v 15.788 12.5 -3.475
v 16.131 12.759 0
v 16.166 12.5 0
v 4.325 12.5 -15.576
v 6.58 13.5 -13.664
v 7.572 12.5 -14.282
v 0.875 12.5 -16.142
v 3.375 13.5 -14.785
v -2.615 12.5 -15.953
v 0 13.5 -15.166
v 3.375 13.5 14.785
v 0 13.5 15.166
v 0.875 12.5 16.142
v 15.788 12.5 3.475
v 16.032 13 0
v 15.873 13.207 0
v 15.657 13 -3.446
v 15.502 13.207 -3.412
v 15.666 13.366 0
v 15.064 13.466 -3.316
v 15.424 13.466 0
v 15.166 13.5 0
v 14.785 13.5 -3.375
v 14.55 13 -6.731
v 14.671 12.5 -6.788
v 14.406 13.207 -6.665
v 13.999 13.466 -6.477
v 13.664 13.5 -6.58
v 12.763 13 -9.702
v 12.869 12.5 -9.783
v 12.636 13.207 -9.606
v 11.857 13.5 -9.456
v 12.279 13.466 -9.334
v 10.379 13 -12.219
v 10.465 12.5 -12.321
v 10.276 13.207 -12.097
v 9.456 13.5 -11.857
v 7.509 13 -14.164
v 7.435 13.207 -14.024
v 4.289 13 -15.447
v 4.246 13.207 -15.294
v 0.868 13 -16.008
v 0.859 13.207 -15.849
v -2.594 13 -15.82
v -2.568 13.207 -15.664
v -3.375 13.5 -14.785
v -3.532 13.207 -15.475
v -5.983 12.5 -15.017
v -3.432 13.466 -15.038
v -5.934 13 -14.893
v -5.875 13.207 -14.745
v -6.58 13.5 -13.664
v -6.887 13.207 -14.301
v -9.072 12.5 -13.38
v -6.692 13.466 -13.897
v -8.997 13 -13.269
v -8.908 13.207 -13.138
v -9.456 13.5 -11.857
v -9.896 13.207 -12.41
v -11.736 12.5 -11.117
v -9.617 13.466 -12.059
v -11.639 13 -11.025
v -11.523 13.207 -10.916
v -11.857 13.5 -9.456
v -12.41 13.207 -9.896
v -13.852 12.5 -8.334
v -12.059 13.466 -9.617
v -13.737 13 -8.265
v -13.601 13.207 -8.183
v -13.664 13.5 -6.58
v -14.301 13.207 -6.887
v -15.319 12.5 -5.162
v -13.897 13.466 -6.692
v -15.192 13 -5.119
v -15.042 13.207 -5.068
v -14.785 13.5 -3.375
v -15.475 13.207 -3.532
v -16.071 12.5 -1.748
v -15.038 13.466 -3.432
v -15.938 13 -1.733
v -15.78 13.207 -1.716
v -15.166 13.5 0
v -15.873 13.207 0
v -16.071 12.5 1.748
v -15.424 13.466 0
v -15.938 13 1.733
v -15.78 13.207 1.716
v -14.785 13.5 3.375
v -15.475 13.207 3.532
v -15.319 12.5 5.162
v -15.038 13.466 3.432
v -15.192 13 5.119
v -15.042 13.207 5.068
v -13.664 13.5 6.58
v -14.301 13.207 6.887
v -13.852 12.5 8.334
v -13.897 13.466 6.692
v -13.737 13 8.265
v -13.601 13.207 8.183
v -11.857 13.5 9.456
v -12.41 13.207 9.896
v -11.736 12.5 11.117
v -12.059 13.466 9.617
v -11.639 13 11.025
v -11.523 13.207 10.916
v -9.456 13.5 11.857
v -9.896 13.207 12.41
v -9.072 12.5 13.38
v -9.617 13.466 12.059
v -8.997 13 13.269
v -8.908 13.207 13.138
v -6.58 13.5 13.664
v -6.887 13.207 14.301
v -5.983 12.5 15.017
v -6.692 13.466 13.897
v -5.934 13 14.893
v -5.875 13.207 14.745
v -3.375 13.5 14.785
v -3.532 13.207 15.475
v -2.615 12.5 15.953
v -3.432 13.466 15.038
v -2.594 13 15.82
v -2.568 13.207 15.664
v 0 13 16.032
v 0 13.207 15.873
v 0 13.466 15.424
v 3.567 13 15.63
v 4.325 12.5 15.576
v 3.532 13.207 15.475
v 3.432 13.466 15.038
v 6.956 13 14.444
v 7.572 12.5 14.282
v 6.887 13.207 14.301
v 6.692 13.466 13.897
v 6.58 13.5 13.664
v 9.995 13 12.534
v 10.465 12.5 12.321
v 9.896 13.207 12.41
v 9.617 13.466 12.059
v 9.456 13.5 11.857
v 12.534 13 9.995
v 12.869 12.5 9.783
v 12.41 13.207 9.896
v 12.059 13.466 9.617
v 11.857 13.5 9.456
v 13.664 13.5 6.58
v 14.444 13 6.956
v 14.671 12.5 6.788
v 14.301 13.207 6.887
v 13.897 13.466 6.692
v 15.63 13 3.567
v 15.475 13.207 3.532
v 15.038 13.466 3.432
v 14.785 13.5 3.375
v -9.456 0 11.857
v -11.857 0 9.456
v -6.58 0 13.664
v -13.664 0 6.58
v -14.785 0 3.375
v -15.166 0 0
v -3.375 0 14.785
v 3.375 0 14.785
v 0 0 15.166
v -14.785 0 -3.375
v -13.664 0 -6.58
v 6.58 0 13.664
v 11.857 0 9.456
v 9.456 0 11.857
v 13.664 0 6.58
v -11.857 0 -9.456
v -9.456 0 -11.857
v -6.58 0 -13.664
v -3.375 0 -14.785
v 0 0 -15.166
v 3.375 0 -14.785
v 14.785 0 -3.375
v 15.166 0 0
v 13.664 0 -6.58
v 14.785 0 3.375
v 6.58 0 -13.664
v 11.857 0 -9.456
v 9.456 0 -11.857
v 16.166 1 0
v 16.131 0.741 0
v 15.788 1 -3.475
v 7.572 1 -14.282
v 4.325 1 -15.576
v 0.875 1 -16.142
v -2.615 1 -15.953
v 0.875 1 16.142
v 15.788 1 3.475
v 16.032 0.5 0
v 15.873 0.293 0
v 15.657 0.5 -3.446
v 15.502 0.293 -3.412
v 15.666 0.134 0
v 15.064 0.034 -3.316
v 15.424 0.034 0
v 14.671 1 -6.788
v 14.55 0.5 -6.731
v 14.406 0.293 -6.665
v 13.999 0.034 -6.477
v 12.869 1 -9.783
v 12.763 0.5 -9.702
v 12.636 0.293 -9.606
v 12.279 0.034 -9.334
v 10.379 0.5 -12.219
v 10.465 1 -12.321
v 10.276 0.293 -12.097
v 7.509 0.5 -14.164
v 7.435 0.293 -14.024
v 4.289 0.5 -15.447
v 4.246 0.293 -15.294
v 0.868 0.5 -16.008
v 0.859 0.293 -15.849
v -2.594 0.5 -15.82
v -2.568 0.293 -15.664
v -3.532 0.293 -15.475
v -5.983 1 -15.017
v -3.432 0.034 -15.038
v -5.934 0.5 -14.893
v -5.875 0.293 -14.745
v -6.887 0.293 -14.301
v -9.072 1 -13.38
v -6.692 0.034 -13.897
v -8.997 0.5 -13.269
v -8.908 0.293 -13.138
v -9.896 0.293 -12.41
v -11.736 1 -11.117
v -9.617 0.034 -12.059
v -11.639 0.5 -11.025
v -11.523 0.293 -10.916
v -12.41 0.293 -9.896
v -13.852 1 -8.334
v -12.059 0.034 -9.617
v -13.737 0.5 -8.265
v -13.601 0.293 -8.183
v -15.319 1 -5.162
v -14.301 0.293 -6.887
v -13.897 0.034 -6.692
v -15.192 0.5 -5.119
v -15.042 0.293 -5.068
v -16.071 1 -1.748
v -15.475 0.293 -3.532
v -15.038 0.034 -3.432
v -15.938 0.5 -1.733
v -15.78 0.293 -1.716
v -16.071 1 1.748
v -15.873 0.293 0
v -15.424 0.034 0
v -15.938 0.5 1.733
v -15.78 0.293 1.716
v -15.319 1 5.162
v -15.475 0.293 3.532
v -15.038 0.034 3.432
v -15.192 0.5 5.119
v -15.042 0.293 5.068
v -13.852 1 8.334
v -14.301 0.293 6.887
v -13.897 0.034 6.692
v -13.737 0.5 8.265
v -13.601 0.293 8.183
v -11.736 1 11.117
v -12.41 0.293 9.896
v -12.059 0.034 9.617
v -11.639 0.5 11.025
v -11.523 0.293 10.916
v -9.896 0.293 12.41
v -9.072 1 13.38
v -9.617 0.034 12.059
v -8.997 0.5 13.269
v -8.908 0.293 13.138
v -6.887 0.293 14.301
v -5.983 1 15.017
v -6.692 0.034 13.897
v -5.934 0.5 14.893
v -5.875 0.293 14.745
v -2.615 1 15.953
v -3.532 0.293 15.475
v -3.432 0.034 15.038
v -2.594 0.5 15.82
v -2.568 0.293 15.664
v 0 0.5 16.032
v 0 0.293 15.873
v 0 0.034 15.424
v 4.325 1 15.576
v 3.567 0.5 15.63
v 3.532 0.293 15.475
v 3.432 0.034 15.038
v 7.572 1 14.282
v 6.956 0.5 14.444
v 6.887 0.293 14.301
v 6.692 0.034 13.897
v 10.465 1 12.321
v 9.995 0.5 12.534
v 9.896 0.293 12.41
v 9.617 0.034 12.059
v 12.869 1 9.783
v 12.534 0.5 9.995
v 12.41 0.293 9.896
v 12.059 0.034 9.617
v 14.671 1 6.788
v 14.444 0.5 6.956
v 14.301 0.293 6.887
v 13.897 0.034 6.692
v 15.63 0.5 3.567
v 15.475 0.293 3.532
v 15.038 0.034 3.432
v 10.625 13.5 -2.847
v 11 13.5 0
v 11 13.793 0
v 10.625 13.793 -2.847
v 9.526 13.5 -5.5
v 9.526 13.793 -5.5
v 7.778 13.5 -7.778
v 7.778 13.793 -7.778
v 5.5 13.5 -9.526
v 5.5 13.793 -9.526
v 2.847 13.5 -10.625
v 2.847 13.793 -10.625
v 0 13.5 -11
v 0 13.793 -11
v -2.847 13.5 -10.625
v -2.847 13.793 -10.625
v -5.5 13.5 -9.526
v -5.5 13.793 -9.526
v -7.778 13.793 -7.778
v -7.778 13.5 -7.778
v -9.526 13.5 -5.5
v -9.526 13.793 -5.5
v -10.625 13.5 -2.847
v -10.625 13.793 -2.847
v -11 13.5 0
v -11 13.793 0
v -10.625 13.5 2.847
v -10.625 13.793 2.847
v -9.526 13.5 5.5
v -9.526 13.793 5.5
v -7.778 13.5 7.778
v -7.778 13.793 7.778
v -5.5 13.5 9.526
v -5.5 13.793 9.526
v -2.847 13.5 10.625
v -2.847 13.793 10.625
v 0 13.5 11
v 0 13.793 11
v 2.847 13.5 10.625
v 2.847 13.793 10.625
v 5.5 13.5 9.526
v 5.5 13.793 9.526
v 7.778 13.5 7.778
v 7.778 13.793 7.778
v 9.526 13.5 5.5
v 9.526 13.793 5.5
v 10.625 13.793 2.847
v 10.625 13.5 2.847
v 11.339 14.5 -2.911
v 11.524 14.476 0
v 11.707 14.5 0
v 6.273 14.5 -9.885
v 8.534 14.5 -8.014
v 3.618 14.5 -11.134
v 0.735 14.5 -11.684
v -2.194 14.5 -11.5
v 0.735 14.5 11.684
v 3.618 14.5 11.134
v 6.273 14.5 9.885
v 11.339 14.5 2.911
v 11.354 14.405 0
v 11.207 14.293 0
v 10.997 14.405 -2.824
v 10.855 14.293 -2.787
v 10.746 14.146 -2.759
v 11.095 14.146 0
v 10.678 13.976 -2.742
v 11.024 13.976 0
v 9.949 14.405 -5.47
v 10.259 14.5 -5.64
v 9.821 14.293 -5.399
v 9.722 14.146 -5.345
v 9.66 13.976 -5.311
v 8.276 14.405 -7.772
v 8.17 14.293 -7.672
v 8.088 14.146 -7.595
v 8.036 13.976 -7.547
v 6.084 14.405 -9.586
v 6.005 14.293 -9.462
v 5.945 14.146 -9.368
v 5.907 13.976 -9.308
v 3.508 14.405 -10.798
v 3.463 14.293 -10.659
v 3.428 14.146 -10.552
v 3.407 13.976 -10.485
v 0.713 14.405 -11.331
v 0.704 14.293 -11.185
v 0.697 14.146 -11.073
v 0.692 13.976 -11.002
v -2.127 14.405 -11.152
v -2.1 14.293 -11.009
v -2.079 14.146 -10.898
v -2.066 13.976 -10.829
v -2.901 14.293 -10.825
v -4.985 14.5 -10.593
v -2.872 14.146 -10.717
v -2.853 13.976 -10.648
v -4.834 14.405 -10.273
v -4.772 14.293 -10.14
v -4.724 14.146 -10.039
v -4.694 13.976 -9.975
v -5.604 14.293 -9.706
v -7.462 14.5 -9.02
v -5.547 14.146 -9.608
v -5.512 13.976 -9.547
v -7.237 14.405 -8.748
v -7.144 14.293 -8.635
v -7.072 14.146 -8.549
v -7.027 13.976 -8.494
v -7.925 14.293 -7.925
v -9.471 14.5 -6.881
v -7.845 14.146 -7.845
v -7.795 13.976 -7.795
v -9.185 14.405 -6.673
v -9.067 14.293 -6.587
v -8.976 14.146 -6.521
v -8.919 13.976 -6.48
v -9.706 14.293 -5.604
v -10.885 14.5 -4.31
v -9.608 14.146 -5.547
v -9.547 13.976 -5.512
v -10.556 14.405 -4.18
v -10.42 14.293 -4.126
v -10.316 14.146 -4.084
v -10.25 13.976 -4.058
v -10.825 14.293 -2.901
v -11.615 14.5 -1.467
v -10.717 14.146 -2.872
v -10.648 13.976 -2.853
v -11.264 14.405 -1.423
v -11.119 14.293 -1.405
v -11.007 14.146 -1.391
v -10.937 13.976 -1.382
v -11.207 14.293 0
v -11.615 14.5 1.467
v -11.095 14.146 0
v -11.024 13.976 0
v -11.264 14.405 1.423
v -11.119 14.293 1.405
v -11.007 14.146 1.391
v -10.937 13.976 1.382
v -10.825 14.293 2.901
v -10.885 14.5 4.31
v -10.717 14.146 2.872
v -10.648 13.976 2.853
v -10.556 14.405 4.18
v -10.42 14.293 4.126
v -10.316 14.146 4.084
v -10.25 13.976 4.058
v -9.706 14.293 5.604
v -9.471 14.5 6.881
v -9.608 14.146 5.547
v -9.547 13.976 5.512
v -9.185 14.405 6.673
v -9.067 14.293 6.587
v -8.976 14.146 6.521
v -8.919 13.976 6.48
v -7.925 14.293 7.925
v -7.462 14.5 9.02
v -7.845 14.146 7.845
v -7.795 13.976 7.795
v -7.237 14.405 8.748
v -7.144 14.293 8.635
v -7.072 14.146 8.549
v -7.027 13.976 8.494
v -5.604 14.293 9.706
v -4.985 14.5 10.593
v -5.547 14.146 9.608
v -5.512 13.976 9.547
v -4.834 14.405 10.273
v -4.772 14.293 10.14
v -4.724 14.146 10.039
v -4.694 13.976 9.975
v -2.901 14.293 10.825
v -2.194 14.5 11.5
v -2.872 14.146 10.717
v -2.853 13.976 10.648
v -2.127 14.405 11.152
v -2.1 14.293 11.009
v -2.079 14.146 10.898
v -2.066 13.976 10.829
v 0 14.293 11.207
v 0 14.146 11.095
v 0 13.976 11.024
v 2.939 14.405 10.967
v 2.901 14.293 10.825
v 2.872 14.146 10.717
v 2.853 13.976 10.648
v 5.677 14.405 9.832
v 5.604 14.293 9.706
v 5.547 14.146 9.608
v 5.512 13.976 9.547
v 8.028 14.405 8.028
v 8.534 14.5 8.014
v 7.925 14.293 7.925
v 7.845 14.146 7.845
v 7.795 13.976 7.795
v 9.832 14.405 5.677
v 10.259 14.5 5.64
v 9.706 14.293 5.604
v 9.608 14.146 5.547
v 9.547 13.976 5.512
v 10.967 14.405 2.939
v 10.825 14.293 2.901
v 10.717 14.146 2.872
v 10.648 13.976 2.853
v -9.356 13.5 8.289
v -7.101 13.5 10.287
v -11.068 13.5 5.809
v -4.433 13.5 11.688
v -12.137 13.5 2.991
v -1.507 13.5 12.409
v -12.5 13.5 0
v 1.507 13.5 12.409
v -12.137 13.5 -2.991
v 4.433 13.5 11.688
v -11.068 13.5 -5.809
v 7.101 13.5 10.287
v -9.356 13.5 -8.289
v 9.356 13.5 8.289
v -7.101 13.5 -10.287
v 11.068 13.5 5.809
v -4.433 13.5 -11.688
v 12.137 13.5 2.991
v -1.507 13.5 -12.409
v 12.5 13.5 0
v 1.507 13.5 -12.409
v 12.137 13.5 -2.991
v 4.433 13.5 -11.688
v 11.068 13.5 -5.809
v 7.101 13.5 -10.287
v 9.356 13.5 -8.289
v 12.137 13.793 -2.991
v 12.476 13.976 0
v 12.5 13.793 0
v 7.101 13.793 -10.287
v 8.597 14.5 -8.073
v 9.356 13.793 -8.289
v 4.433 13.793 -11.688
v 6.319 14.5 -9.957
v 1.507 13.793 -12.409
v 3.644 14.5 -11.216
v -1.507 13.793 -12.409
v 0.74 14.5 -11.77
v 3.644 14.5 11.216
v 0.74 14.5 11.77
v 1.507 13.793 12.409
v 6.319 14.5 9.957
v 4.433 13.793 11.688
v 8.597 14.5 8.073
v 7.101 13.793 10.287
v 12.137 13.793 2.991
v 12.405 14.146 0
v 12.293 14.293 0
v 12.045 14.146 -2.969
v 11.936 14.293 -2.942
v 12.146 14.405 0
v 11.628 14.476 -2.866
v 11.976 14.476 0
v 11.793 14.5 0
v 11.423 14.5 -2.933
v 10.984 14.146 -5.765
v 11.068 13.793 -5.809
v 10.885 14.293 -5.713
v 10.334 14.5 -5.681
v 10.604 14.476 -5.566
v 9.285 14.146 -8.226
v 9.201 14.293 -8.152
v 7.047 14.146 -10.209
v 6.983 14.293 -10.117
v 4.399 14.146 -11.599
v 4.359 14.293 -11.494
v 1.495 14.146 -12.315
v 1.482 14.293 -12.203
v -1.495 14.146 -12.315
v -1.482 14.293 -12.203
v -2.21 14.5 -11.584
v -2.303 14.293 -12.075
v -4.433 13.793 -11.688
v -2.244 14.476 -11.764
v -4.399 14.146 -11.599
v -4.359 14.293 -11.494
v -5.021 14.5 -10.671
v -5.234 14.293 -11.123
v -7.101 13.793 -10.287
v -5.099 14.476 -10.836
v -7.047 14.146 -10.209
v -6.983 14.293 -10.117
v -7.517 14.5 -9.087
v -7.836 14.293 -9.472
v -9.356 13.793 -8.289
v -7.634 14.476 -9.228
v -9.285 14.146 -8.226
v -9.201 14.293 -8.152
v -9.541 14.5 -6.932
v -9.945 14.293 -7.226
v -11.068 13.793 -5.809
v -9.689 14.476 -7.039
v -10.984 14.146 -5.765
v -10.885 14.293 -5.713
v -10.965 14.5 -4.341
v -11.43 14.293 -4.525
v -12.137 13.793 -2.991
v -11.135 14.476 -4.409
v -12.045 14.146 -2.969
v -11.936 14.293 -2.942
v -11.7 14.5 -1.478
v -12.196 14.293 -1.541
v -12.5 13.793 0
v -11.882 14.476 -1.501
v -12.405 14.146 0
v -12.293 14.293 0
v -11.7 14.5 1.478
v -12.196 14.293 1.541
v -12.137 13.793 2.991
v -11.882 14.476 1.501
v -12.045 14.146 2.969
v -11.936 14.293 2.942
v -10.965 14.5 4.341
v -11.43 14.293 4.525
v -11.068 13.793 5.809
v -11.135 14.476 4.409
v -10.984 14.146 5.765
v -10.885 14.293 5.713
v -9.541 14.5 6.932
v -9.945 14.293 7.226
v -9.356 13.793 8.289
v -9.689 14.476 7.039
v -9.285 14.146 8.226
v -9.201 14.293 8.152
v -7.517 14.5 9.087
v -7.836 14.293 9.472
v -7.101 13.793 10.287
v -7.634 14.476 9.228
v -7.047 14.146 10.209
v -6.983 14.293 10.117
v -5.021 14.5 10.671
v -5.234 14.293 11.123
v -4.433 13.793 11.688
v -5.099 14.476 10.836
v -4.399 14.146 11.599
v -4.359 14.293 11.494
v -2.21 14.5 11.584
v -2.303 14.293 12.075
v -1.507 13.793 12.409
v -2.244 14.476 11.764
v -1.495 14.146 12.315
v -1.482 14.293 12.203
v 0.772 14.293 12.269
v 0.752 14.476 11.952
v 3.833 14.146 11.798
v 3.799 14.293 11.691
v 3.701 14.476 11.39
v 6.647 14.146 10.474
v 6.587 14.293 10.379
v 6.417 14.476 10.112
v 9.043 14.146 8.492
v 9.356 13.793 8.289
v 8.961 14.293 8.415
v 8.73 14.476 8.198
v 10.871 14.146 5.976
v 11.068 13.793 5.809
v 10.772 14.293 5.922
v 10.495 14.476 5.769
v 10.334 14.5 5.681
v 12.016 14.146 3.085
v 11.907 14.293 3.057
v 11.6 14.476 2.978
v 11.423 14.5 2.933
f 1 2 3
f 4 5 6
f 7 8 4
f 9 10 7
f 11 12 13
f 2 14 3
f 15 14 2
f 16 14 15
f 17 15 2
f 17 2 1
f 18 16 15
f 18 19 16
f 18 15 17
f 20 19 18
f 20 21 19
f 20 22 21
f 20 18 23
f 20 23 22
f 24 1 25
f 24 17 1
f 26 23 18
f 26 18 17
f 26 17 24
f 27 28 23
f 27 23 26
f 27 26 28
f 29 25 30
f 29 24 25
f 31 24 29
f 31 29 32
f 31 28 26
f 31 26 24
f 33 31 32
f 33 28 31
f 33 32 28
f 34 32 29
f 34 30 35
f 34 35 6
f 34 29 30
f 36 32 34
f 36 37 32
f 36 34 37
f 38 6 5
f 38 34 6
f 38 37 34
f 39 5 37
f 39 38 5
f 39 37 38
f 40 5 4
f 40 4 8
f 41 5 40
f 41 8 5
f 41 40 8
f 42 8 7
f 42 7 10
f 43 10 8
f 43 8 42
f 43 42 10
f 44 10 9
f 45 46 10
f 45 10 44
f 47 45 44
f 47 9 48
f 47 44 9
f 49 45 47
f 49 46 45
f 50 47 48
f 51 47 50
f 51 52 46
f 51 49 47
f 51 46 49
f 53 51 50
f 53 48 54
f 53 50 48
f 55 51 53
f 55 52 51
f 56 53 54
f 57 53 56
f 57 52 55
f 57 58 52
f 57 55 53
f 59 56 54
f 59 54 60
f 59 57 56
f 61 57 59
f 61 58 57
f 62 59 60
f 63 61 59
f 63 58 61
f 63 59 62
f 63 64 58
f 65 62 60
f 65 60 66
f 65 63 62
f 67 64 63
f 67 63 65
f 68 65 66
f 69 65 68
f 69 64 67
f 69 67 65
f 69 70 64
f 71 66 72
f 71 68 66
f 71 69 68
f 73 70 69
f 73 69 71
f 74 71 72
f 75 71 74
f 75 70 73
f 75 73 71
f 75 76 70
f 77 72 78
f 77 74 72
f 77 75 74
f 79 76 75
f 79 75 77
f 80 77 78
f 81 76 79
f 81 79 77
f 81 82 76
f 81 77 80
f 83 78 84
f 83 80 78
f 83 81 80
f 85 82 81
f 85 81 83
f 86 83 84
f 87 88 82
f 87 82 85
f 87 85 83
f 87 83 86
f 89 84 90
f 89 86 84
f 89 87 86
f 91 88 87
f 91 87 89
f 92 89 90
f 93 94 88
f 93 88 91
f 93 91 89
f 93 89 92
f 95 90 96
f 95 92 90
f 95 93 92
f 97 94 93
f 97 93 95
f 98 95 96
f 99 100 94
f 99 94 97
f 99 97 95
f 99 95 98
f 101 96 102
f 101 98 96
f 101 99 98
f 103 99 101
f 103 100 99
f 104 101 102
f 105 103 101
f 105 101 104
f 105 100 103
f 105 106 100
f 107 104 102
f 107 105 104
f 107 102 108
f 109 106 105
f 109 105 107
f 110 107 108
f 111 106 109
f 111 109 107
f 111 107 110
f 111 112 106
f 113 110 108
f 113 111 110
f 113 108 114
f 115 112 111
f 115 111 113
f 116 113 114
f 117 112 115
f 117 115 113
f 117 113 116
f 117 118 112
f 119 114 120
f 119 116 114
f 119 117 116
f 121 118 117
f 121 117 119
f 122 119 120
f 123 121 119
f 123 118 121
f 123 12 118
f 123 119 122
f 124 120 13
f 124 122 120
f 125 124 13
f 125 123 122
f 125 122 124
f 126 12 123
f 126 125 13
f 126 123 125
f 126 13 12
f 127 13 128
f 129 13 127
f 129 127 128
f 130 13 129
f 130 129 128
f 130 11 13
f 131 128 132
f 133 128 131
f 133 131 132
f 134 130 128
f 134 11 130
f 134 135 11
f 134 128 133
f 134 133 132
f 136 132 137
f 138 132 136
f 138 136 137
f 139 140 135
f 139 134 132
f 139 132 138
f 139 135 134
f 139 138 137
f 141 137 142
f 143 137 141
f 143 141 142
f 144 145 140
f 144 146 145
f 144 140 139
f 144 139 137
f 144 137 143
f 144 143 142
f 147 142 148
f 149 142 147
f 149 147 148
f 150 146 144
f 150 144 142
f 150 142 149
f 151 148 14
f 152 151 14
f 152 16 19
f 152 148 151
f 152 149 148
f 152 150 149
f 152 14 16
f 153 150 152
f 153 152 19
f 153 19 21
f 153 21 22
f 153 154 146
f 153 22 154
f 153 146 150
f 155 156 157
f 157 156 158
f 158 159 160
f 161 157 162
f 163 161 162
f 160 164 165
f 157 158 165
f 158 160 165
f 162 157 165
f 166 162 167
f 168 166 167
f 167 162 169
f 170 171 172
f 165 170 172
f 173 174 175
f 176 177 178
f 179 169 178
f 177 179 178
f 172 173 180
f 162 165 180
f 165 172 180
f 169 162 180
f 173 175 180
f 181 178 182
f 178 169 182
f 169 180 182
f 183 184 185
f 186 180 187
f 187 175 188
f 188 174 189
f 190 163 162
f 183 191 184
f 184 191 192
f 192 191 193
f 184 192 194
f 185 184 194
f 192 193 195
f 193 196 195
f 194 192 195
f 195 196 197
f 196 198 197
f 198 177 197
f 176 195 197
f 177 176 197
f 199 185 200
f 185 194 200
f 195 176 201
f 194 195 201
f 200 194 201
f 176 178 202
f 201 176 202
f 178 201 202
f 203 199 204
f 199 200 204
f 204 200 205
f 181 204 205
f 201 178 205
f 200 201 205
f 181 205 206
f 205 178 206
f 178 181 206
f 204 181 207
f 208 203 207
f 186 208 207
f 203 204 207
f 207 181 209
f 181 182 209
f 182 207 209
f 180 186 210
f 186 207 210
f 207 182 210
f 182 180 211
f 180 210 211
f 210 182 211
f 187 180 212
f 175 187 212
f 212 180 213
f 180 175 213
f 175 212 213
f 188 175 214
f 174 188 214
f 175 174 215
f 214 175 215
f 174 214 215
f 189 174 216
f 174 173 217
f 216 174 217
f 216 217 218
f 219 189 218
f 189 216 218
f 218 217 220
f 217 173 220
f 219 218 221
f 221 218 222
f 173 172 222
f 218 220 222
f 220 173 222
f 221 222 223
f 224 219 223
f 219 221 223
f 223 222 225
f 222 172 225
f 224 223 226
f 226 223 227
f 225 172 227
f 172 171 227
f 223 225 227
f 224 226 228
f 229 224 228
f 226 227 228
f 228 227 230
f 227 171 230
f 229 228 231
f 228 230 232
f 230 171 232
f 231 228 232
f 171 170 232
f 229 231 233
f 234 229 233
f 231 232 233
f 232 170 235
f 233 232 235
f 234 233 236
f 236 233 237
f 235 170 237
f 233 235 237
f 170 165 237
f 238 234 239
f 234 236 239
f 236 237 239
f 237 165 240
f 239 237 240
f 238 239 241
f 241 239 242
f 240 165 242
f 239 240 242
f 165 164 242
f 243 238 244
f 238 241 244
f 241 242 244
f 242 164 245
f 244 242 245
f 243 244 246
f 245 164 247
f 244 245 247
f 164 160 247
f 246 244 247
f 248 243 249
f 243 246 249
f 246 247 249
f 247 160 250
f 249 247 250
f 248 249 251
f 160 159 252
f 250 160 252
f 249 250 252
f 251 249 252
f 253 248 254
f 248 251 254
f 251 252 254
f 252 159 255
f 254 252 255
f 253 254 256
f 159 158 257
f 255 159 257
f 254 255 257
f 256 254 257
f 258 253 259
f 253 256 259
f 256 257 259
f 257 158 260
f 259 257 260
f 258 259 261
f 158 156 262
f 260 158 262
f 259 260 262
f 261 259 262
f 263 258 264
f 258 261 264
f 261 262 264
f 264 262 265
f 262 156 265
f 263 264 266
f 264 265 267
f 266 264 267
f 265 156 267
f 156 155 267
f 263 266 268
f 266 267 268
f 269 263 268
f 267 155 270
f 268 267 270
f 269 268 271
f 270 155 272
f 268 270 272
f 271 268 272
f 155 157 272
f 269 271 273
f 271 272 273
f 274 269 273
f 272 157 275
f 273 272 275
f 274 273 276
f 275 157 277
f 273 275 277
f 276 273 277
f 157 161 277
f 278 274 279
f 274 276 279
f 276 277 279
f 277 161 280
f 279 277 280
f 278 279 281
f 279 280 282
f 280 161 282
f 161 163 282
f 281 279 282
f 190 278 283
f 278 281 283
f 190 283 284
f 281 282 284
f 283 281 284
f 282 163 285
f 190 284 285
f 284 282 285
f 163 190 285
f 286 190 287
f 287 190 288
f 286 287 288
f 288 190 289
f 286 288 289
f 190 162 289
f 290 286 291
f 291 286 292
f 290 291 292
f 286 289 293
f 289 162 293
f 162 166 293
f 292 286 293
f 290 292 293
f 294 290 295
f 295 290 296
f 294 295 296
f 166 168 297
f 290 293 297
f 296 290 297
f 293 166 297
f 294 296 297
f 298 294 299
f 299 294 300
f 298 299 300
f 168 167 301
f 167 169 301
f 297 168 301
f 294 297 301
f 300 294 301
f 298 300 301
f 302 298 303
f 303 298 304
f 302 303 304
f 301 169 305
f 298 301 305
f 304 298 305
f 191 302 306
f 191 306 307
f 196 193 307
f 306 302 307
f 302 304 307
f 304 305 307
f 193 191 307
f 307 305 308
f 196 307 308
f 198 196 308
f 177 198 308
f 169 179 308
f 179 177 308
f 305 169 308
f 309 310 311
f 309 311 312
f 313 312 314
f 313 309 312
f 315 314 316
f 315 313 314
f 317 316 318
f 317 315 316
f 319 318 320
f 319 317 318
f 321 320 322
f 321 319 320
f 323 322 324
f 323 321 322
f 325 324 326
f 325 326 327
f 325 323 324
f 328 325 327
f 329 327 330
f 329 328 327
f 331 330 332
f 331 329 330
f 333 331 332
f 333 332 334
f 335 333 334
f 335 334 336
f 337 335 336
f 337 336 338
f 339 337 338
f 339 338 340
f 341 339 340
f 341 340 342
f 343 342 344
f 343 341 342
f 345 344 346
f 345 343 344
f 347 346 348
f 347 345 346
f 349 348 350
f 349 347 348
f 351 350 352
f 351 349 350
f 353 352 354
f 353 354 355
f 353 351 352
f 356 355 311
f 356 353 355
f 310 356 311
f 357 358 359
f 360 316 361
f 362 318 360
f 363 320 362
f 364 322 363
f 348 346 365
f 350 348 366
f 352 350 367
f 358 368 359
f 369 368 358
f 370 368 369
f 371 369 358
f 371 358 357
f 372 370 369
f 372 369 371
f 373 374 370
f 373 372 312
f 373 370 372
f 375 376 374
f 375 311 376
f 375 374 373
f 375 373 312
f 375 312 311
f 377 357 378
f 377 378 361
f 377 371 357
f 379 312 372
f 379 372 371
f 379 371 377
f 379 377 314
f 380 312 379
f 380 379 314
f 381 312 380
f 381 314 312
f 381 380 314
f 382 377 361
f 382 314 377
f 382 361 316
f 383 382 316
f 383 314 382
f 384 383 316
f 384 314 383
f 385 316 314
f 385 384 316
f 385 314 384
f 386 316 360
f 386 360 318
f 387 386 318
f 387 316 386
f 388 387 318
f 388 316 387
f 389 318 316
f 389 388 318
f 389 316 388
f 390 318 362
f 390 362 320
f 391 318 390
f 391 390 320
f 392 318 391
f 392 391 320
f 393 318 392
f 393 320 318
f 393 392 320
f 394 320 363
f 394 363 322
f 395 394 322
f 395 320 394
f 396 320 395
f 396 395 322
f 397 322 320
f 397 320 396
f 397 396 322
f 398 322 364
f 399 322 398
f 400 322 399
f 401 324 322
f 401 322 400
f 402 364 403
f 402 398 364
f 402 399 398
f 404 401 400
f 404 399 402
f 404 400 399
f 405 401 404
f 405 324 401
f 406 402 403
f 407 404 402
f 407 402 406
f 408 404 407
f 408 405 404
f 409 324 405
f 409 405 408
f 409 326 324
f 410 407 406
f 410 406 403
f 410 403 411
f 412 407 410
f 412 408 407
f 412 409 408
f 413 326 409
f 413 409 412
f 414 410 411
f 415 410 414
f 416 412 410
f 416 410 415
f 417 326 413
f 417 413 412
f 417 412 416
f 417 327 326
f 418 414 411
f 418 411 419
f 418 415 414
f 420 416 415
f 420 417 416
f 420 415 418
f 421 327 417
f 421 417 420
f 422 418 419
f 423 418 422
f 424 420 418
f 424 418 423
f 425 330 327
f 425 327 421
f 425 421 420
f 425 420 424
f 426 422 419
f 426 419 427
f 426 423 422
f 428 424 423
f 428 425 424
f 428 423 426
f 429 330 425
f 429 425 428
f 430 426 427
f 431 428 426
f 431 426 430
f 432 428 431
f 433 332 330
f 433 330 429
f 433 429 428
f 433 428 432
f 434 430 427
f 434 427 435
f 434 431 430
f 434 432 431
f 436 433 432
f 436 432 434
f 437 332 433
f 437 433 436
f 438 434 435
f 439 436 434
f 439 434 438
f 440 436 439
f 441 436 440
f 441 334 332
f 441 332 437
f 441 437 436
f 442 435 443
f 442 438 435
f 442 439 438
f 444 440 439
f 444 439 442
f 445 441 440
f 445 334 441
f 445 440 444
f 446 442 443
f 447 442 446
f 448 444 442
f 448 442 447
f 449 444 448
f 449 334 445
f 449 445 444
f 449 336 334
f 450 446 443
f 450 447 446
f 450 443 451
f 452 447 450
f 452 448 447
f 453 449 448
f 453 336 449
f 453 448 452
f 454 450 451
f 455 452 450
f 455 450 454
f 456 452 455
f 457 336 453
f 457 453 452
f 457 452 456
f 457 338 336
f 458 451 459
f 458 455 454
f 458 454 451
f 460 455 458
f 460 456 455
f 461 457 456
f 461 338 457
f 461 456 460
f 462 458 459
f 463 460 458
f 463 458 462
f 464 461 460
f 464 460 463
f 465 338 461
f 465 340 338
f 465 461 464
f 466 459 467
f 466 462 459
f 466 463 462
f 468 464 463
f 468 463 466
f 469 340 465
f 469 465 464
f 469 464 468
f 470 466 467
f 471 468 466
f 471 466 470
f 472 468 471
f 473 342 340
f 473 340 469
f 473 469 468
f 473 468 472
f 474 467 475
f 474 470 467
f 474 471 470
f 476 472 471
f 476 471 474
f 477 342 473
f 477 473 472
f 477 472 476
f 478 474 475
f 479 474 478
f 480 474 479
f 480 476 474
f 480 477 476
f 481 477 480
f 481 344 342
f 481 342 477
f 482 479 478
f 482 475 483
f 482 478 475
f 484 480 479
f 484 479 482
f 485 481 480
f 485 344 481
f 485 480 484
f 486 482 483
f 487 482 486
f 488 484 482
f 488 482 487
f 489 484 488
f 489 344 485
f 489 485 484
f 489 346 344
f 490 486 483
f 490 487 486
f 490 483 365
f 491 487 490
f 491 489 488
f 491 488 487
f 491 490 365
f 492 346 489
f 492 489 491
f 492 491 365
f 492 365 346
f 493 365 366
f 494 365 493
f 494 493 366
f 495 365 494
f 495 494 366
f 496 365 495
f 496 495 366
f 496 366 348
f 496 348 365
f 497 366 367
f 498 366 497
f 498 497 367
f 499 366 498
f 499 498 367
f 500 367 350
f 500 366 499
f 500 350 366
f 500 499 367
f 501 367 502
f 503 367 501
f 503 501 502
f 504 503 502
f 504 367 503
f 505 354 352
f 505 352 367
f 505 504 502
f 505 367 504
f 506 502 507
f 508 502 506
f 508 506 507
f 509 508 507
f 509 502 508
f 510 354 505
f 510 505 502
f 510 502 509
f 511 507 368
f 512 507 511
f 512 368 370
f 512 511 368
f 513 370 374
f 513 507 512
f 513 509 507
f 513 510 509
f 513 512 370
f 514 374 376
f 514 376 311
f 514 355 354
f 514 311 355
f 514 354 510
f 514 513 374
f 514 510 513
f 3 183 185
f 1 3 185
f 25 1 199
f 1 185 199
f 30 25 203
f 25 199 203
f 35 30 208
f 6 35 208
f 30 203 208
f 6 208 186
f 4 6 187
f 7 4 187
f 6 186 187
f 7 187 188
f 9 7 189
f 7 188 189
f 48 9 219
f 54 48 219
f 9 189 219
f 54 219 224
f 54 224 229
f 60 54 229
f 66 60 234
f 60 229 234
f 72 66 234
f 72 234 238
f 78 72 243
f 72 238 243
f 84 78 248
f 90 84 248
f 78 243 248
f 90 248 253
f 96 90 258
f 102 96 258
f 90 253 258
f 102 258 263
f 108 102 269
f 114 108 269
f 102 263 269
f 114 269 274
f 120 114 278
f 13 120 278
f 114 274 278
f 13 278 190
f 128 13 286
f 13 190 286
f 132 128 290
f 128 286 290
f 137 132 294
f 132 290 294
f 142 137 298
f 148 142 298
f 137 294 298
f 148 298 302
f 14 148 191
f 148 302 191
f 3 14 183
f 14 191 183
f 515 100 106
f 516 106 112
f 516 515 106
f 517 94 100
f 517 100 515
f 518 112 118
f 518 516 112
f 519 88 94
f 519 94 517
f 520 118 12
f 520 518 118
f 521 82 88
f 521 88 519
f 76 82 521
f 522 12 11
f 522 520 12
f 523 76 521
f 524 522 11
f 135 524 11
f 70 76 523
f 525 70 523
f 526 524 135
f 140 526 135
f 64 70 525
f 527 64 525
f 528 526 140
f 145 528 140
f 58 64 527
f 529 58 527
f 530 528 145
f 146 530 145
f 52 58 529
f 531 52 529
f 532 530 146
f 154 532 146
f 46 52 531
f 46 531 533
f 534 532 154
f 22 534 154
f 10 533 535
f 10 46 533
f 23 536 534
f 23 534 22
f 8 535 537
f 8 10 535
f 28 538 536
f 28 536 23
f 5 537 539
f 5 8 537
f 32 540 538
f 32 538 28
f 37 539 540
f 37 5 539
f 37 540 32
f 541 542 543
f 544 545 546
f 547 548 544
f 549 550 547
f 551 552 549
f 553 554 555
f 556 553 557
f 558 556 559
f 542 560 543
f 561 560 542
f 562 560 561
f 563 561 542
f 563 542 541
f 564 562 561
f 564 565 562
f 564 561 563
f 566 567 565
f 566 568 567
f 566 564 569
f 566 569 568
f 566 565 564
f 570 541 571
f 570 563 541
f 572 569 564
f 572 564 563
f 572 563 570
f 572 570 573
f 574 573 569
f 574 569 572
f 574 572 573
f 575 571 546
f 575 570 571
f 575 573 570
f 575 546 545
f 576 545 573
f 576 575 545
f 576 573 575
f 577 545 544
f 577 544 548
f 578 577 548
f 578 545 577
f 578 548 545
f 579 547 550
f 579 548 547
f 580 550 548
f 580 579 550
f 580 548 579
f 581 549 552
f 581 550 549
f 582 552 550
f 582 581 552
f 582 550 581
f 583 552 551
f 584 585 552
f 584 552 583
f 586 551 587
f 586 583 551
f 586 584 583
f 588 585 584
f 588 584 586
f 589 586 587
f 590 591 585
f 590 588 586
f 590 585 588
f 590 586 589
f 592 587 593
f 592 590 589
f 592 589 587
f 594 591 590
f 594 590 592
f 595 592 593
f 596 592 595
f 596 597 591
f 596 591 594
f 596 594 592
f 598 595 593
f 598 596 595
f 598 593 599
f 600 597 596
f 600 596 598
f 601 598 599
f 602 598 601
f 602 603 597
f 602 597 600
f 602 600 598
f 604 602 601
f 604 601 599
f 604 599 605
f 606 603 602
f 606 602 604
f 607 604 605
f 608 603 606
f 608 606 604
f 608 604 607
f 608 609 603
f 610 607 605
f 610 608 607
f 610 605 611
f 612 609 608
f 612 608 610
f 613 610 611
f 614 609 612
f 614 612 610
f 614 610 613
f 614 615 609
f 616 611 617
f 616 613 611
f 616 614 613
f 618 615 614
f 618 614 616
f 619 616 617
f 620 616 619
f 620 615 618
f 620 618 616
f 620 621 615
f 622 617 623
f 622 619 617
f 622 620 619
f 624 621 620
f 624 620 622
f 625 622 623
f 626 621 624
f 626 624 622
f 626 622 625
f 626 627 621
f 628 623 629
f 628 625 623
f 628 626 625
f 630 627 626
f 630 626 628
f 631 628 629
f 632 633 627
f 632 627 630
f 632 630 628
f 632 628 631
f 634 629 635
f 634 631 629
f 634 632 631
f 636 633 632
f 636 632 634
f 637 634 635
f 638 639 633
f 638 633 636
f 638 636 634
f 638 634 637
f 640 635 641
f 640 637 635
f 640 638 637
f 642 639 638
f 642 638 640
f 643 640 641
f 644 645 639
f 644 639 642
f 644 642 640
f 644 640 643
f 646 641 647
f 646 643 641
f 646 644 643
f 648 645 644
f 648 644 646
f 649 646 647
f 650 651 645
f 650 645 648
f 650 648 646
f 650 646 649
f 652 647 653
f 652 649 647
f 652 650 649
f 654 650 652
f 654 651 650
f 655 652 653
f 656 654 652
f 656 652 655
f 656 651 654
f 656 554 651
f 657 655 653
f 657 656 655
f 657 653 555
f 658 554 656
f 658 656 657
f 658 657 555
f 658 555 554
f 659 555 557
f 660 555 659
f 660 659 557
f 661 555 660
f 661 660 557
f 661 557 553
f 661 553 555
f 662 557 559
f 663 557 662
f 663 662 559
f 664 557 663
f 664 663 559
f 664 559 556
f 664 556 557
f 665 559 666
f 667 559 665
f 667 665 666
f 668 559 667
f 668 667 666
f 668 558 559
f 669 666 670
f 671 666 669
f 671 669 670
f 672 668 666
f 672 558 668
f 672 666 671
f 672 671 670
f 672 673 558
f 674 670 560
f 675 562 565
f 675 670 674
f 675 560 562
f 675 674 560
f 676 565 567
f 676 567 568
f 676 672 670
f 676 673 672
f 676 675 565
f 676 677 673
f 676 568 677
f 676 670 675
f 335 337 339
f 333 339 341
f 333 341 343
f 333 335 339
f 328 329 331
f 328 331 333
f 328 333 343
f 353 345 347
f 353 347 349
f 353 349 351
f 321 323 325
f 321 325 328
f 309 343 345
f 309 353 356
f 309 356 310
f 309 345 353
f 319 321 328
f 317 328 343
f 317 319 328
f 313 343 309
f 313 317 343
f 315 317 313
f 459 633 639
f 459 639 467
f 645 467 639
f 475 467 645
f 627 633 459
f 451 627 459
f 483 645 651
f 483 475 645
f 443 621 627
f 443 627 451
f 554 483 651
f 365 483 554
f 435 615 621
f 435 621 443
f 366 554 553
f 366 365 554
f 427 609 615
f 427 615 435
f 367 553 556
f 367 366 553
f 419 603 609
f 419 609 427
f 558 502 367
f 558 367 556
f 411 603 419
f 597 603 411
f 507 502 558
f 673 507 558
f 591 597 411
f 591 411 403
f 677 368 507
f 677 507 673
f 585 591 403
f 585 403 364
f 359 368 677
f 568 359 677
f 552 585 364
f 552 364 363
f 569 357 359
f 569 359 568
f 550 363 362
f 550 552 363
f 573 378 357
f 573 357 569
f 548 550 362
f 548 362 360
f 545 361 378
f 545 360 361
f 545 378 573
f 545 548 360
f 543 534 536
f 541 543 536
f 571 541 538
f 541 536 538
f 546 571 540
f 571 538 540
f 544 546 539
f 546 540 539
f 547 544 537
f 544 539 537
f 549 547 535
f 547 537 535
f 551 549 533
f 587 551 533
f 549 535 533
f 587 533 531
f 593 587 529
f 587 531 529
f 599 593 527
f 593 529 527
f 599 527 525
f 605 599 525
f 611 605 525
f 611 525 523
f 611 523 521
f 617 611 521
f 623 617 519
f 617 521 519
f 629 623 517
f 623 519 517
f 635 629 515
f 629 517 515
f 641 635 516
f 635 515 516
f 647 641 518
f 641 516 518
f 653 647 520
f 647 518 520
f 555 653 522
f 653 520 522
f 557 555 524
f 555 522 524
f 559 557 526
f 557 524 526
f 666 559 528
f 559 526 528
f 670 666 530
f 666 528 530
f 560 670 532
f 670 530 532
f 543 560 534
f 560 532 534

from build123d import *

# Parameters (mm, degrees)
SKETCH1_R           = 16.1655
BOSS_EXTRUDE1_DEPTH = 13.5
FILLET1_R           = 1
SKETCH2_R           = 12.5
SKETCH2_R_2         = 11
BOSS_EXTRUDE2_DEPTH = 1
FILLET4_R           = 0.707


with BuildPart() as part:
    # Sketch1 → Boss-Extrude1 (new body)
    with BuildSketch(Plane(origin=(0, 0, 0), x_dir=(1, 0, 0), z_dir=(0, 1, 0))):
        Circle(SKETCH1_R)
    extrude(amount=BOSS_EXTRUDE1_DEPTH)

    # Fillet1
    fillet1_edges = [part.edges().sort_by_distance(p)[0] for p in [
        (-16.1655, 0, 0),
        (-16.1655, 13.5, 0),
    ]]
    fillet(fillet1_edges, radius=FILLET1_R)

    # Sketch2 → Boss-Extrude2 (add)
    with BuildSketch(Plane(origin=(0, 13.5, 0), x_dir=(1, 0, 0), z_dir=(0, 1, 0))):
        Circle(SKETCH2_R)
        Circle(SKETCH2_R_2, mode=Mode.SUBTRACT)
    extrude(amount=BOSS_EXTRUDE2_DEPTH)

    # Fillet4
    fillet4_edges = [part.edges().sort_by_distance(p)[0] for p in [
        (-12.5, 14.5, 0),
        (-11, 14.5, 0),
    ]]
    fillet(fillet4_edges, radius=FILLET4_R)


solid = part.part
